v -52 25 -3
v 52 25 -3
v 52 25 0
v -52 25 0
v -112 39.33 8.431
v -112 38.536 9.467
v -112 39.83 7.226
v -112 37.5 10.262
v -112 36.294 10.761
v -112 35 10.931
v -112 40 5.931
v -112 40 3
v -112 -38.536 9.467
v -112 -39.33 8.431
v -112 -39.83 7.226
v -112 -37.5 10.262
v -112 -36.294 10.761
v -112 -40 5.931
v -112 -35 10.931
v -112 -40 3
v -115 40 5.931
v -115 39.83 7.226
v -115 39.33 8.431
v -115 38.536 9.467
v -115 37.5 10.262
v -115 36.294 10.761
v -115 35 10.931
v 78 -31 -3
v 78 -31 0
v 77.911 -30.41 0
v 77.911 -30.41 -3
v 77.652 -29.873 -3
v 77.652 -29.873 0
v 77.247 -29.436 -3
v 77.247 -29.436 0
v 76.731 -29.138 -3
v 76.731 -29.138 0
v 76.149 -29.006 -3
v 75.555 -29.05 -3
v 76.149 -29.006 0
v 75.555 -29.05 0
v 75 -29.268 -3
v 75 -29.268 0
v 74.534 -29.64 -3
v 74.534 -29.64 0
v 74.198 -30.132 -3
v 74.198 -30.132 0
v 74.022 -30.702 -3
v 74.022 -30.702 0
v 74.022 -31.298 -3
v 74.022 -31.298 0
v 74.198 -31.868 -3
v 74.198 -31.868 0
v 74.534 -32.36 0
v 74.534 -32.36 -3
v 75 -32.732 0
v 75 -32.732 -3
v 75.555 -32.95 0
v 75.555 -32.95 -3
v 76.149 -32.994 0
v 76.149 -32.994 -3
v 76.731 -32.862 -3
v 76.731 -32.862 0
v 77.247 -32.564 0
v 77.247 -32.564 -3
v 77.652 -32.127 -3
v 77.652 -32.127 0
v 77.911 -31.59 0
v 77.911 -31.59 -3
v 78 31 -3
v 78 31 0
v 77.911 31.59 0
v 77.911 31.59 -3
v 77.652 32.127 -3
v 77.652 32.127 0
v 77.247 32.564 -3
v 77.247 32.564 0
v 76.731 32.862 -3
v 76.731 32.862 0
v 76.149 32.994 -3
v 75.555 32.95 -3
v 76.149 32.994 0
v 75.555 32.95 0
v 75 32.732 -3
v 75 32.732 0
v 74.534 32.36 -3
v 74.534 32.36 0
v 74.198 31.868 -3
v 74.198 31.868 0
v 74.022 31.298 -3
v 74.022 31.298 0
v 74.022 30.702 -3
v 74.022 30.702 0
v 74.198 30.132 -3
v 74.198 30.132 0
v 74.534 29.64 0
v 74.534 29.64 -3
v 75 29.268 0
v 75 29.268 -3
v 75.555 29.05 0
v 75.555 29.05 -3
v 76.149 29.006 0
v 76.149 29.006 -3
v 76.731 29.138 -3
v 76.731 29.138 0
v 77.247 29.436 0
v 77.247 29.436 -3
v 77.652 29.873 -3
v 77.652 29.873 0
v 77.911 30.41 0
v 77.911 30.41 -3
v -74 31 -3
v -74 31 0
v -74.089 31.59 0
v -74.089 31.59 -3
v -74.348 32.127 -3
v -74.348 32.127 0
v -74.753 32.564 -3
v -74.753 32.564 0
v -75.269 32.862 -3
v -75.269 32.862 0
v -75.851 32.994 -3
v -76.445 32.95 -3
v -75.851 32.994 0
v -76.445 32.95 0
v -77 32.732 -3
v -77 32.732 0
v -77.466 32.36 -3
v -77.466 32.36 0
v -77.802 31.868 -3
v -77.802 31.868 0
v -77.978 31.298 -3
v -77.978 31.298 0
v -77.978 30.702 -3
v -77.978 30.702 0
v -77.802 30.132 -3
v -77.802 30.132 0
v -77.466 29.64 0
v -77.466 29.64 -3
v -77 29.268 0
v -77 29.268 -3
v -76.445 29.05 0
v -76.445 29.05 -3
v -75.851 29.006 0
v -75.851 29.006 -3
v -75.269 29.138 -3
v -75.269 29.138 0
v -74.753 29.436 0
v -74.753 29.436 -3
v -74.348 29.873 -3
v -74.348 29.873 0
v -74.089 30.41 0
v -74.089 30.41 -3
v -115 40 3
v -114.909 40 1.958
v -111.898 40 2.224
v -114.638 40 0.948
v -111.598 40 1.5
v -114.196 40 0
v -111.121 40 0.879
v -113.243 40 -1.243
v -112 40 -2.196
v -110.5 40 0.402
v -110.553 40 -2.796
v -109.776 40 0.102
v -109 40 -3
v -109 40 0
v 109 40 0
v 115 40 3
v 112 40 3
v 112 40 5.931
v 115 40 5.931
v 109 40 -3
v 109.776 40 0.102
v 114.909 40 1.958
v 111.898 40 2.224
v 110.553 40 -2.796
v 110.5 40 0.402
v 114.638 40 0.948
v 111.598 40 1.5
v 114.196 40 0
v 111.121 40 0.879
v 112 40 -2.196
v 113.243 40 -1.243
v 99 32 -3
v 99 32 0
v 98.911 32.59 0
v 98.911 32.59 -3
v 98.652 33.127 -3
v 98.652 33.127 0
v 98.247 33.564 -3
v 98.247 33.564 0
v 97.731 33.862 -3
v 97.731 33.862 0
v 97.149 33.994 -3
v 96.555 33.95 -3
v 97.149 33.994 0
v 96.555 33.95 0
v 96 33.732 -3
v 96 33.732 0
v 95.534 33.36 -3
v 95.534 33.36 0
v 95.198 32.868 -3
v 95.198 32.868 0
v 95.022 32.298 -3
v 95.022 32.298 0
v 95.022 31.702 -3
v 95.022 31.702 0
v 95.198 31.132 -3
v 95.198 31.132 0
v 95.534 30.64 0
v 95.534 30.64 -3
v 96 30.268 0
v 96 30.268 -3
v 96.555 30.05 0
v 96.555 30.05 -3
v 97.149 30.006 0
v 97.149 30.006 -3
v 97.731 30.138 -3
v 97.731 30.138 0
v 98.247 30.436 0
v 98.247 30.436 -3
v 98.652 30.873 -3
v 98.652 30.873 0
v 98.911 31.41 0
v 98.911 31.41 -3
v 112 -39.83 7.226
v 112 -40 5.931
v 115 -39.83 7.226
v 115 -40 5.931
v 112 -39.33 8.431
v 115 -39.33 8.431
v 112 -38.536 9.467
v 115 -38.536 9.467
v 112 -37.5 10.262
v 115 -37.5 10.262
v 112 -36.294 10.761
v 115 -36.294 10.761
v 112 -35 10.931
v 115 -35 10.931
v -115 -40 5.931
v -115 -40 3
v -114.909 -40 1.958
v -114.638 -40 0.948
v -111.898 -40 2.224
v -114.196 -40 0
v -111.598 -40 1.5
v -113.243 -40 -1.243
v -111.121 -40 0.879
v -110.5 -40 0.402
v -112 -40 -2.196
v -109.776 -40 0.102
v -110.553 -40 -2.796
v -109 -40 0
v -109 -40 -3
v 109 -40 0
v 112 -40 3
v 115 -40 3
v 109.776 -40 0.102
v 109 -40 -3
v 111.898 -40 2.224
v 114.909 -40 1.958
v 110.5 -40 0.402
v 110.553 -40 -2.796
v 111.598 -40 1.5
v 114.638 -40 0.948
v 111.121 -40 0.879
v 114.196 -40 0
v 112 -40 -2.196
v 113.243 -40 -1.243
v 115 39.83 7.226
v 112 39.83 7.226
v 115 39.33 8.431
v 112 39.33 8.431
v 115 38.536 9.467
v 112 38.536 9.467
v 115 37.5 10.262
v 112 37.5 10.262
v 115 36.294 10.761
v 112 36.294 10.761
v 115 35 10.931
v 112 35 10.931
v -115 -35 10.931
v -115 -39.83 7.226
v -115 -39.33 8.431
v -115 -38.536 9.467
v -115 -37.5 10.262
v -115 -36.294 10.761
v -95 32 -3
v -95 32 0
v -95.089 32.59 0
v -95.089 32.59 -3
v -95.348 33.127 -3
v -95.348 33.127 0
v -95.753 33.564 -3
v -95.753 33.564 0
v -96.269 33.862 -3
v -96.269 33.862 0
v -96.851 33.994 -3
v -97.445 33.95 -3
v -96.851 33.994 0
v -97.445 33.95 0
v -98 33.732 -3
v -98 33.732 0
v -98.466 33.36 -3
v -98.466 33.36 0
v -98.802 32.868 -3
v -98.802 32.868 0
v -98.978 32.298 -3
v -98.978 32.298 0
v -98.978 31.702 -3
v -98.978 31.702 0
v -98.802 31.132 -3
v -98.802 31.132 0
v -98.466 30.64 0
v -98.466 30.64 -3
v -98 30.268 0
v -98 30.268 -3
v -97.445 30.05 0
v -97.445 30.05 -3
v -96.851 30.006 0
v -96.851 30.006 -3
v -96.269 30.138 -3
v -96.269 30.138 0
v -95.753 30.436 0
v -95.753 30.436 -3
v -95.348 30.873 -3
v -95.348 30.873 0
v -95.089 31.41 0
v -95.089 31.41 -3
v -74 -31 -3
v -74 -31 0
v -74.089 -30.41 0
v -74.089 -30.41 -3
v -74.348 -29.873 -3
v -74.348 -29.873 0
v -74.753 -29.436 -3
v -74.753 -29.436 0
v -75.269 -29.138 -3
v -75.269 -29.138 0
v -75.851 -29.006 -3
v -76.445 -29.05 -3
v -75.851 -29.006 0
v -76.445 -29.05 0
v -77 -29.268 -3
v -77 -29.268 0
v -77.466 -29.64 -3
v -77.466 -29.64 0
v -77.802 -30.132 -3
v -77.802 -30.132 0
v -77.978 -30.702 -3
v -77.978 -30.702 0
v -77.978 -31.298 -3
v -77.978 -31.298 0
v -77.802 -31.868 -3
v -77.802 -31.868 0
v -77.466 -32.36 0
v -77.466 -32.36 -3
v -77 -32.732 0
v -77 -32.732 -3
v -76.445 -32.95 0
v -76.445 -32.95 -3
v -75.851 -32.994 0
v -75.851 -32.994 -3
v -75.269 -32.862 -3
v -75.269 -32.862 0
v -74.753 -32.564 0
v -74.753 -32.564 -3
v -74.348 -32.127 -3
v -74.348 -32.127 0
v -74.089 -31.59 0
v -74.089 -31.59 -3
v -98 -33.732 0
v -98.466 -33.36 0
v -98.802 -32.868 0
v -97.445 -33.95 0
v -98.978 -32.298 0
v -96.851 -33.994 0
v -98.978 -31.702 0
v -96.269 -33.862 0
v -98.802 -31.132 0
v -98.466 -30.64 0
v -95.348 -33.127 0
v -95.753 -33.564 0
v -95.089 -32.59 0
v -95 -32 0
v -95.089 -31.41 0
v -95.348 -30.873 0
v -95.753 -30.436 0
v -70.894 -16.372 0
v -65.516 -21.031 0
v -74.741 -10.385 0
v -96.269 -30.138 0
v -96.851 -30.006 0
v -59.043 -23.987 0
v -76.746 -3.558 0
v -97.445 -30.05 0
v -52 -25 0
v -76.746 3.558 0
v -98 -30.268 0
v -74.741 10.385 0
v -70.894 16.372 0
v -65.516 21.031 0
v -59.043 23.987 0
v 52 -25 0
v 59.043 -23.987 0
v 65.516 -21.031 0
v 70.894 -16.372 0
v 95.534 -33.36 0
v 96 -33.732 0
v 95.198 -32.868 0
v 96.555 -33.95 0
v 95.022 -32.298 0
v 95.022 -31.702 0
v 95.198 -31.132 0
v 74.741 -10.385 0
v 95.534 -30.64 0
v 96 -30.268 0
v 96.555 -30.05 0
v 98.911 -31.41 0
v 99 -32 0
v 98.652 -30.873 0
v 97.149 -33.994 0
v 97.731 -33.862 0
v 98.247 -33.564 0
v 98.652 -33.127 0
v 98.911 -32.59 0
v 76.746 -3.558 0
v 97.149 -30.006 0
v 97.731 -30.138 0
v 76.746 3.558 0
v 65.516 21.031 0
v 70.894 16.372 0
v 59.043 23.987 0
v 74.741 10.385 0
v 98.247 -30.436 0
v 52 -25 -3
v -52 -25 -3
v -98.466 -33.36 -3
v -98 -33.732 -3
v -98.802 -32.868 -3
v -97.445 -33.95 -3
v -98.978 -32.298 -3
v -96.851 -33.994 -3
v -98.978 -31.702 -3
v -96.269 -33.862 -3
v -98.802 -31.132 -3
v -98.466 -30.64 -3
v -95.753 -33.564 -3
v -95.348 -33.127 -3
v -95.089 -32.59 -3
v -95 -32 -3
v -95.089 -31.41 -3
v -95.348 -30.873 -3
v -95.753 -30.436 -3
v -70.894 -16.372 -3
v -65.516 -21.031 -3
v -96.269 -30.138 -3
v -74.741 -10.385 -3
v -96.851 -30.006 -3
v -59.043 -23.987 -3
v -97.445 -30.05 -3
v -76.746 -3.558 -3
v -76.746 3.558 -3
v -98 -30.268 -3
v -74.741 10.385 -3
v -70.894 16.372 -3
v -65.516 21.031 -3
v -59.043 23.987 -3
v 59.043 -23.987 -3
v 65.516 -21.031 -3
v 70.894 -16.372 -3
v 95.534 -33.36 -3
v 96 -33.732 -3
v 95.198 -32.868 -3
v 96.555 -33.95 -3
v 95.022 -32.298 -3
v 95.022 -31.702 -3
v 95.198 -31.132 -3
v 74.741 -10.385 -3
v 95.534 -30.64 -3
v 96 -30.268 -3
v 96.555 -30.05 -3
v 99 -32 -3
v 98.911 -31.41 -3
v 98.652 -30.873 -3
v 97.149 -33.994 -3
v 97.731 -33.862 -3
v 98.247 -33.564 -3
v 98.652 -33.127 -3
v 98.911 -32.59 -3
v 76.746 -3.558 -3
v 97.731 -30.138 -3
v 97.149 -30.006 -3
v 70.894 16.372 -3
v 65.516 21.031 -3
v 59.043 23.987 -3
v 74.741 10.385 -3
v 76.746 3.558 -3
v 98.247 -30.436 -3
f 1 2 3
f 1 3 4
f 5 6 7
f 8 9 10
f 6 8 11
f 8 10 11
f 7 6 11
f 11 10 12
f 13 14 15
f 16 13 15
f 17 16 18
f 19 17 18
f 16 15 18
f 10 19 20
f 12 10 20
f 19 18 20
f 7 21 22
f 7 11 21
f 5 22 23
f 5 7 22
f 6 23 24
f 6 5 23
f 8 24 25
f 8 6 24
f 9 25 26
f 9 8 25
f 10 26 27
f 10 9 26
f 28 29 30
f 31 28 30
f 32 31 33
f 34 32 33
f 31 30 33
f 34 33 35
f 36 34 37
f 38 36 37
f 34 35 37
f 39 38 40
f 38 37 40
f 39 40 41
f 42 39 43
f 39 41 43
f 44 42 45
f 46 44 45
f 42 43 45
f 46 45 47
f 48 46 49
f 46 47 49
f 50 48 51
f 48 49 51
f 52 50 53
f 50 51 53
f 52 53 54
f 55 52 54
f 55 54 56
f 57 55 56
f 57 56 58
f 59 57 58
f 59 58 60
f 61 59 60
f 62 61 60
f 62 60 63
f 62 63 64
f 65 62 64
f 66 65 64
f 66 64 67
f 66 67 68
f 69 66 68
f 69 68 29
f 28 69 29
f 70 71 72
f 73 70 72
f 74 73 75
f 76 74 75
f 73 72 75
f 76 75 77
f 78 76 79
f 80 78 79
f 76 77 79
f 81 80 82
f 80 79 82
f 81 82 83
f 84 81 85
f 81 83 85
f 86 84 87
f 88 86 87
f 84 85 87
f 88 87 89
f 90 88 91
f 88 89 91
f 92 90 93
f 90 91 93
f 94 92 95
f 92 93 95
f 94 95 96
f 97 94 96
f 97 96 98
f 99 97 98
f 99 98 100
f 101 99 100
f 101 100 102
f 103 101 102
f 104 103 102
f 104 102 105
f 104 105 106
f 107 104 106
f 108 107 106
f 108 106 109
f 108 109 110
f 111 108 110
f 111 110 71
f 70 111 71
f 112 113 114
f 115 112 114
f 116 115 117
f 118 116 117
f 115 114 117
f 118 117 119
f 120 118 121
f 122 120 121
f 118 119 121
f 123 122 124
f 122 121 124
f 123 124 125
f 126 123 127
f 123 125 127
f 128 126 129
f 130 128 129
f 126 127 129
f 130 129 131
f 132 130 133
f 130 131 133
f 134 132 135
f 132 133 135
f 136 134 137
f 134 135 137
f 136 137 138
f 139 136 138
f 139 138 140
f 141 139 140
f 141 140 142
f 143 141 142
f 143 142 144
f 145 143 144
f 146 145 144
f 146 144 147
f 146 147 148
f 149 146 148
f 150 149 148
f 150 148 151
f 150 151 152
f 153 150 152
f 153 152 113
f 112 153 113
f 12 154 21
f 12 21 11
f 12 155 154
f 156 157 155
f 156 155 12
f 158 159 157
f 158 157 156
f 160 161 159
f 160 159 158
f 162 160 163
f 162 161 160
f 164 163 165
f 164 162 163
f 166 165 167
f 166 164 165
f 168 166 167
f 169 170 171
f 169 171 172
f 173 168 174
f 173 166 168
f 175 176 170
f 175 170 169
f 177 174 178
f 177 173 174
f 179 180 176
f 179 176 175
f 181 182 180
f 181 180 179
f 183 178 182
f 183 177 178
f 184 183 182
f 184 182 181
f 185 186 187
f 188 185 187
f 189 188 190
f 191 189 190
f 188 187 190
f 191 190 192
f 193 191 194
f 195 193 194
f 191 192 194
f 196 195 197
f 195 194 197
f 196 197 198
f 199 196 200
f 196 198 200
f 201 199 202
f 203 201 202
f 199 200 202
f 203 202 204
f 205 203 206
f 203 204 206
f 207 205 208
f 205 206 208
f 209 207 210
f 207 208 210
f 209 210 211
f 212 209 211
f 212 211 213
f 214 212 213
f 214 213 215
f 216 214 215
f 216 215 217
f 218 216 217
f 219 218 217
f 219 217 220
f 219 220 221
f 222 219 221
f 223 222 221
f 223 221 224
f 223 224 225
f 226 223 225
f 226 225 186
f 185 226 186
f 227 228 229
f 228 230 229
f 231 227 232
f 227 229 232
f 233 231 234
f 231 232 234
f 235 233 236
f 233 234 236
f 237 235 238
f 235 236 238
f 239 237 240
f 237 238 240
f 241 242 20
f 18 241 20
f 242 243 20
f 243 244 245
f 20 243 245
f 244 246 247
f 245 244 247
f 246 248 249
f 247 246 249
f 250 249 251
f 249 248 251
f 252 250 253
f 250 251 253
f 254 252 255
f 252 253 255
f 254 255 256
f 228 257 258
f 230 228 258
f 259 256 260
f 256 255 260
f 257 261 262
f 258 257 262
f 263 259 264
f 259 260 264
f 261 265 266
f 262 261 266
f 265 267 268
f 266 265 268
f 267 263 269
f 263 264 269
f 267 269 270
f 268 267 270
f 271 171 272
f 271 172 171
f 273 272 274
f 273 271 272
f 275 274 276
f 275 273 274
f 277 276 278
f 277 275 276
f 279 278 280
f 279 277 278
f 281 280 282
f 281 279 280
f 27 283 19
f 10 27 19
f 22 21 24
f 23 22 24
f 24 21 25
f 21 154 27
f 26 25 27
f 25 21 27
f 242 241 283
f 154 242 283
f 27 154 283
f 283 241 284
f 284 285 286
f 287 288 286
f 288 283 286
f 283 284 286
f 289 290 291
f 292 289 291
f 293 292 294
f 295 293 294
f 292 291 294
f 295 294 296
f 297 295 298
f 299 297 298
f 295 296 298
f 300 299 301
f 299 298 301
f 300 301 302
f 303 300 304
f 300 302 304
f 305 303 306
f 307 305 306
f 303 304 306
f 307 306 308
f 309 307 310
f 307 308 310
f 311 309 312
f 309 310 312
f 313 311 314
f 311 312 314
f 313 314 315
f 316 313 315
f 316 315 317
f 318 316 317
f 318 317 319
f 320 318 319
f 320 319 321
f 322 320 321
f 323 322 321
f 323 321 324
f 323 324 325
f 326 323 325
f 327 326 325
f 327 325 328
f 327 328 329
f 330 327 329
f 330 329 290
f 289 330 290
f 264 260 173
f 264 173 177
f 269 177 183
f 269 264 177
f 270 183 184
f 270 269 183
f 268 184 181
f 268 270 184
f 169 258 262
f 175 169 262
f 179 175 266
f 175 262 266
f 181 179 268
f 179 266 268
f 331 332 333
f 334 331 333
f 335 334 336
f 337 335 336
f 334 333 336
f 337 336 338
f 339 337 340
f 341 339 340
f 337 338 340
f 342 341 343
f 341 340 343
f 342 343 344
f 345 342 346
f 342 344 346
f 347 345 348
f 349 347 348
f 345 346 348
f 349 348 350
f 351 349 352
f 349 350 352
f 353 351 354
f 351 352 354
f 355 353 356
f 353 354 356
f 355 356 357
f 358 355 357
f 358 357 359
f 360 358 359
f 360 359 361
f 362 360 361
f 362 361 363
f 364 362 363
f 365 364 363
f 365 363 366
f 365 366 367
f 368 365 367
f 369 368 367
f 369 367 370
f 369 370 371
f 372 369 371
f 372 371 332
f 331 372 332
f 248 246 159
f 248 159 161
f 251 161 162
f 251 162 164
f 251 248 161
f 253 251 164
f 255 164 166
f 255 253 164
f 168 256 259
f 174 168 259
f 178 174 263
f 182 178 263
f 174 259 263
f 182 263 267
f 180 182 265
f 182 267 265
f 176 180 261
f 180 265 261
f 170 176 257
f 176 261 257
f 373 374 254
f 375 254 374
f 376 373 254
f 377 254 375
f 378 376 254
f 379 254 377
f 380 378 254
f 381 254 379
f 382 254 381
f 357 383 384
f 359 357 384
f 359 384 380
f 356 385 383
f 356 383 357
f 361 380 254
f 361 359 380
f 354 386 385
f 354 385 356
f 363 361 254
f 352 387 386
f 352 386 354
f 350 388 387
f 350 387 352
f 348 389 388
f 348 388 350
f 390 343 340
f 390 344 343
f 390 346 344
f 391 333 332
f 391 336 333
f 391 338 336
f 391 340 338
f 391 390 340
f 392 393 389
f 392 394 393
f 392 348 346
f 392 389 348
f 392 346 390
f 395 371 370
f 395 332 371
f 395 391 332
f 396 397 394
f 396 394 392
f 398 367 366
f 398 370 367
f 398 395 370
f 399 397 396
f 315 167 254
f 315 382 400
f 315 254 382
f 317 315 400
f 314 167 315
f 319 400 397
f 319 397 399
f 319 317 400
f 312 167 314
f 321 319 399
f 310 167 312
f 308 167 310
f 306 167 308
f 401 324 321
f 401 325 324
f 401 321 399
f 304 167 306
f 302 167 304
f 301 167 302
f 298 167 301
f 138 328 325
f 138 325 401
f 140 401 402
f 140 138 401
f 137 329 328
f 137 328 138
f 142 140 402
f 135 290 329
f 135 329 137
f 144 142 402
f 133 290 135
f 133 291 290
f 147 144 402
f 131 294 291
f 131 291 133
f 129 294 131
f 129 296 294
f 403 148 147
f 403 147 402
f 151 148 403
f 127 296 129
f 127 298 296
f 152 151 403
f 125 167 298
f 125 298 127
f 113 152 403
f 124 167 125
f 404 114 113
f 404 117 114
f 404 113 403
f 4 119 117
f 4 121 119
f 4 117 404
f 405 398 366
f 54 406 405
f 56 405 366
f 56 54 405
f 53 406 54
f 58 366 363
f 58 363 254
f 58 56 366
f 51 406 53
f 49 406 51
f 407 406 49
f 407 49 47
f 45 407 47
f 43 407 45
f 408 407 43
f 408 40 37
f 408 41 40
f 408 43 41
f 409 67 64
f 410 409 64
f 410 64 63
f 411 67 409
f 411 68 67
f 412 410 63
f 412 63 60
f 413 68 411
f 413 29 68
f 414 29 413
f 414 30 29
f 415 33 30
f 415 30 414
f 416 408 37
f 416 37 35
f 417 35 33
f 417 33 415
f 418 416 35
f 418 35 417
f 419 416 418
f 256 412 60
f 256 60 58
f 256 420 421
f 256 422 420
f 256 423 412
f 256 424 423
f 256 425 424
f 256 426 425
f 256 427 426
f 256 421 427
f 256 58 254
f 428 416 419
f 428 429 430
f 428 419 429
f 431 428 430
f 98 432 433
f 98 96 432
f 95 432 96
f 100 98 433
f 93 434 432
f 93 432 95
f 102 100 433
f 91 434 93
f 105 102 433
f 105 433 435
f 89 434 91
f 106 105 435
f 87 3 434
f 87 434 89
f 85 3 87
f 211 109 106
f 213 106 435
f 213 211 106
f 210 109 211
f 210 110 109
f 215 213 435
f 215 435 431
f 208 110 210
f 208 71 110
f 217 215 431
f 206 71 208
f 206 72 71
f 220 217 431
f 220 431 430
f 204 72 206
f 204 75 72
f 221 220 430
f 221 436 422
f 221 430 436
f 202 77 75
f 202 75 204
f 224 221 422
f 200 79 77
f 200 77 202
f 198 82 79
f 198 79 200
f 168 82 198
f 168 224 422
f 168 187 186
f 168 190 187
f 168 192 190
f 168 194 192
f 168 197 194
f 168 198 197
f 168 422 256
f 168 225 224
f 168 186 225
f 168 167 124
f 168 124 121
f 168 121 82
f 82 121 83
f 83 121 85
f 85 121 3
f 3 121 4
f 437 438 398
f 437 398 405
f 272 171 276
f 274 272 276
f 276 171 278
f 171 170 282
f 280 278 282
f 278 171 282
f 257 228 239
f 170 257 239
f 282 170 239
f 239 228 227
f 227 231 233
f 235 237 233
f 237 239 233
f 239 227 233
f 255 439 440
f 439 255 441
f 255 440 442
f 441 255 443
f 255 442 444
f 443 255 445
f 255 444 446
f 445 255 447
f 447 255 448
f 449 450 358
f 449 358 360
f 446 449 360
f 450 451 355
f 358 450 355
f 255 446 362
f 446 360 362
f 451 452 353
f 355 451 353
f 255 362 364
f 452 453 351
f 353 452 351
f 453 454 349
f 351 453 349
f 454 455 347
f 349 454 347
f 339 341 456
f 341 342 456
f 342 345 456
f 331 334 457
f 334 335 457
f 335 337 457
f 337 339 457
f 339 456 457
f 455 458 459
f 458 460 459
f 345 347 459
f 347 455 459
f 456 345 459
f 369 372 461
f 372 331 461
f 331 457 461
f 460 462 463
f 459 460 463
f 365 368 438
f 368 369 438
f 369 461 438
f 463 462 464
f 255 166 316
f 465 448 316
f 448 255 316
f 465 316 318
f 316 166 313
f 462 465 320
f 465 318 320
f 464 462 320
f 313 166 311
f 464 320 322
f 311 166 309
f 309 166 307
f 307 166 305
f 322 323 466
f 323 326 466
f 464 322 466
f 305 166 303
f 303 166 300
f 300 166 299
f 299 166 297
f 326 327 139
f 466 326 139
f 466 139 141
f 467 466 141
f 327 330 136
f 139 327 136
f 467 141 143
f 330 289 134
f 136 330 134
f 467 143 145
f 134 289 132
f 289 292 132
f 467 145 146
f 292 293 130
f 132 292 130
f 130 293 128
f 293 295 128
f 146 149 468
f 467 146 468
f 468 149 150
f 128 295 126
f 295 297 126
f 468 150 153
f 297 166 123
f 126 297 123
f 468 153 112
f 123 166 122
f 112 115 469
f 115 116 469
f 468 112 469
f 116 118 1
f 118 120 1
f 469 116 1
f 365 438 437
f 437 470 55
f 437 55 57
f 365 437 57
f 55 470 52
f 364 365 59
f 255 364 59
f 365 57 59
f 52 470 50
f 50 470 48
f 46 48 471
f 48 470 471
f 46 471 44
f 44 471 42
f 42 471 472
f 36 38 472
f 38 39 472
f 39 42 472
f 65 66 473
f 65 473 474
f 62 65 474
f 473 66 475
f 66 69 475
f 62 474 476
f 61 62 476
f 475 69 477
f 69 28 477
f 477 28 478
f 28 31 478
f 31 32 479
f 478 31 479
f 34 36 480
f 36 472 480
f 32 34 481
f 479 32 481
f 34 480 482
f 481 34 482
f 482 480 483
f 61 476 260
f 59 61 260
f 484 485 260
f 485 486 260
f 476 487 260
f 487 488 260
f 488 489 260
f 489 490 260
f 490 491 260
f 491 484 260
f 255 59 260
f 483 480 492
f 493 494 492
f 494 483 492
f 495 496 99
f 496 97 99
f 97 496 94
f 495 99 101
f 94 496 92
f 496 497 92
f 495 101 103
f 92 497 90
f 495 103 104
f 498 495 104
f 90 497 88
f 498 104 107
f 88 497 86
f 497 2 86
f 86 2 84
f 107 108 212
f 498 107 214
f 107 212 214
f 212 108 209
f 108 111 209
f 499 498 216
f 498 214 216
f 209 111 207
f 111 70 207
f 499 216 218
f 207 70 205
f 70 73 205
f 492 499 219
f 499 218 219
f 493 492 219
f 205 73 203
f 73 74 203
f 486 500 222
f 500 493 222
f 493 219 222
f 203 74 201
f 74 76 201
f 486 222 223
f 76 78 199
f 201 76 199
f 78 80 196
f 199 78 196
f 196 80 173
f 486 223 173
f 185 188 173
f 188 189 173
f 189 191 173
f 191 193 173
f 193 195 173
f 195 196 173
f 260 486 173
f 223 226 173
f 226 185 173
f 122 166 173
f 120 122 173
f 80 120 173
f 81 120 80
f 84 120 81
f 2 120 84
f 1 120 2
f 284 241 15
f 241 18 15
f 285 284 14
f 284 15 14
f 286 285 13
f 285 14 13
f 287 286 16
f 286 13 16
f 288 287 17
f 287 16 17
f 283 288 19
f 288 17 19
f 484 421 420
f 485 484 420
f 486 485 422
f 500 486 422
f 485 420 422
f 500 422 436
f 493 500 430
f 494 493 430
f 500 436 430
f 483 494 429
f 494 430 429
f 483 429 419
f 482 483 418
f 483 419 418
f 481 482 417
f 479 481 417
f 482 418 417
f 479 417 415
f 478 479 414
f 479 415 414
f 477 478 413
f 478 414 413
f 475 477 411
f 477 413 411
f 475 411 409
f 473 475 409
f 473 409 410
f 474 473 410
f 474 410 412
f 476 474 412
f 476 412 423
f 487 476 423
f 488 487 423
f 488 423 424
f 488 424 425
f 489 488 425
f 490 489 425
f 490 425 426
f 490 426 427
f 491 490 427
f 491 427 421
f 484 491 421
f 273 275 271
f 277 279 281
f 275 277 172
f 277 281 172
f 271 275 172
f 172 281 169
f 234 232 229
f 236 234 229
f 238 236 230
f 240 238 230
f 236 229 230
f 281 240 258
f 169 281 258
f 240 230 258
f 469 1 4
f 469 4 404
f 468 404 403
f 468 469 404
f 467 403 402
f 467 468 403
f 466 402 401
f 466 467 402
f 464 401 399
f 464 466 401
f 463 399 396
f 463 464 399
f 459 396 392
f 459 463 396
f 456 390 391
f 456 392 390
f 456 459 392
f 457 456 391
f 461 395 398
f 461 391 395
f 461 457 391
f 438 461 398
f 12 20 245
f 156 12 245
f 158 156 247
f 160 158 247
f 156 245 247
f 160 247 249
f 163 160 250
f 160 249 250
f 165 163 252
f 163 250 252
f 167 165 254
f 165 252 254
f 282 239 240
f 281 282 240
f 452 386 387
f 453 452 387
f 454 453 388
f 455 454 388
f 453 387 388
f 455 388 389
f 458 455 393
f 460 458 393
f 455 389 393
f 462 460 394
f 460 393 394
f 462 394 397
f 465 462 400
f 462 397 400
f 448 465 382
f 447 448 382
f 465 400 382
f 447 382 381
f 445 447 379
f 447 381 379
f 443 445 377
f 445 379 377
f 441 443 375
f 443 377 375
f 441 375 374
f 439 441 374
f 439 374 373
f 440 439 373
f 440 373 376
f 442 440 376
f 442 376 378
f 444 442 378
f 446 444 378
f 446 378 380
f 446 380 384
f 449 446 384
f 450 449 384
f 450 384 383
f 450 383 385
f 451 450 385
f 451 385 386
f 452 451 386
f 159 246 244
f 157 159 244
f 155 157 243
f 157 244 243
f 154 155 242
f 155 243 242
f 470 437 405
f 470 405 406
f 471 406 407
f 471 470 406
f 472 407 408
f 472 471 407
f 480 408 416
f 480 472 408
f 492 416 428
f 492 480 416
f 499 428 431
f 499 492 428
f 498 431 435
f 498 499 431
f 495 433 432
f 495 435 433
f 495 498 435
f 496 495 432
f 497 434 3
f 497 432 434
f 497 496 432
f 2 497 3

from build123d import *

# Parameters (mm, degrees)
SKETCH_1_W             = 248
SKETCH_1_H             = 80
SM_BASE_FLANGE_1_DEPTH = 3
SKETCH_6_R             = 2
CUT_EXTRUDE_1_DEPTH    = 10
OTHER_START            = -40
OTHER_1_DEPTH          = 80
OTHER_1_2_DEPTH        = 80
CUT_EXTRUDE_2_DEPTH    = 10
FILLET_1_R             = 5


# Read off the part's stored shape, not the designer's step: 绘制的折弯1
# Sheet-metal steps are written as plain solids
with BuildPart() as part:
    # Sketch 1 → 基体-法兰1 (new body)
    with BuildSketch(Plane.XY):
        Rectangle(SKETCH_1_W, SKETCH_1_H)
    extrude(amount=-SM_BASE_FLANGE_1_DEPTH)

    # 草图6 → 切除-拉伸1 (cut)
    with BuildSketch(Plane.XY):
        with Locations((-97, 32)):
            Circle(SKETCH_6_R)
        with Locations((-76, 31)):
            Circle(SKETCH_6_R)
        with Locations((97, 32)):
            Circle(SKETCH_6_R)
        with Locations((76, 31)):
            Circle(SKETCH_6_R)
        with Locations((76, -31)):
            Circle(SKETCH_6_R)
        with Locations((97, -32)):
            Circle(SKETCH_6_R)
        with Locations((-97, -32)):
            Circle(SKETCH_6_R)
        with Locations((-76, -31)):
            Circle(SKETCH_6_R)
    extrude(amount=-CUT_EXTRUDE_1_DEPTH, mode=Mode.SUBTRACT)

    # Other 1 outline → Other 1 (cut)
    with BuildSketch(Plane(origin=(0, 0, 0), x_dir=(1, 0, 0), z_dir=(0, 1, 0)).offset(OTHER_START)):
        with BuildLine():
            Line((124, 3), (109, 3))
            ThreePointArc((109, 3), (112, 2.196152423), (114.196152423, 0))
            Line((114.196152423, 0), (124, 0))
            Line((124, 0), (124, 3))
        make_face()
        with BuildLine():
            ThreePointArc((-114.196152423, 0), (-112, 2.196152423), (-109, 3))
            Line((-109, 3), (-124, 3))
            Line((-124, 3), (-124, 0))
            Line((-124, 0), (-114.196152423, 0))
        make_face()
    extrude(amount=OTHER_1_DEPTH, mode=Mode.SUBTRACT)

    # Other 1 2 outline → Other 1 2 (add)
    with BuildSketch(Plane(origin=(0, 0, 0), x_dir=(1, 0, 0), z_dir=(0, 1, 0)).offset(OTHER_START)):
        with BuildLine():
            ThreePointArc((115, -3), (114.795554958, -1.447085729), (114.196152423, 0))
            Line((114.196152423, 0), (109, 0))
            ThreePointArc((109, 0), (111.121320344, -0.878679656), (112, -3))
            Line((112, -3), (112, -10.931416529))
            Line((112, -10.931416529), (115, -10.931416529))
            Line((115, -10.931416529), (115, -3))
        make_face()
        with BuildLine():
            Line((-109, 0), (-114.196152423, 0))
            ThreePointArc((-114.196152423, 0), (-114.795554958, -1.447085729), (-115, -3))
            Line((-115, -3), (-115, -10.931416529))
            Line((-115, -10.931416529), (-112, -10.931416529))
            Line((-112, -10.931416529), (-112, -3))
            ThreePointArc((-112, -3), (-111.121320344, -0.878679656), (-109, 0))
        make_face()
    extrude(amount=OTHER_1_2_DEPTH)

    # 草图8 → 切除-拉伸2 (cut)
    with BuildSketch(Plane(origin=(0, 0, -3), x_dir=(-1, 0, 0), z_dir=(0, 0, -1))):
        with BuildLine():
            Line((-52, 25), (52, 25))
            ThreePointArc((52, 25), (77, 0), (52, -25))
            Line((52, -25), (-52, -25))
            ThreePointArc((-52, -25), (-77, 0), (-52, 25))
        make_face()
    extrude(amount=-CUT_EXTRUDE_2_DEPTH, mode=Mode.SUBTRACT)

    # 圆角1
    fillet_1_edges = [part.edges().sort_by_distance(p)[0] for p in [
        (113.5, 40, 10.931416529),
        (113.5, -40, 10.931416529),
        (-113.5, -40, 10.931416529),
        (-113.5, 40, 10.931416529),
    ]]
    fillet(fillet_1_edges, radius=FILLET_1_R)


solid = part.part
